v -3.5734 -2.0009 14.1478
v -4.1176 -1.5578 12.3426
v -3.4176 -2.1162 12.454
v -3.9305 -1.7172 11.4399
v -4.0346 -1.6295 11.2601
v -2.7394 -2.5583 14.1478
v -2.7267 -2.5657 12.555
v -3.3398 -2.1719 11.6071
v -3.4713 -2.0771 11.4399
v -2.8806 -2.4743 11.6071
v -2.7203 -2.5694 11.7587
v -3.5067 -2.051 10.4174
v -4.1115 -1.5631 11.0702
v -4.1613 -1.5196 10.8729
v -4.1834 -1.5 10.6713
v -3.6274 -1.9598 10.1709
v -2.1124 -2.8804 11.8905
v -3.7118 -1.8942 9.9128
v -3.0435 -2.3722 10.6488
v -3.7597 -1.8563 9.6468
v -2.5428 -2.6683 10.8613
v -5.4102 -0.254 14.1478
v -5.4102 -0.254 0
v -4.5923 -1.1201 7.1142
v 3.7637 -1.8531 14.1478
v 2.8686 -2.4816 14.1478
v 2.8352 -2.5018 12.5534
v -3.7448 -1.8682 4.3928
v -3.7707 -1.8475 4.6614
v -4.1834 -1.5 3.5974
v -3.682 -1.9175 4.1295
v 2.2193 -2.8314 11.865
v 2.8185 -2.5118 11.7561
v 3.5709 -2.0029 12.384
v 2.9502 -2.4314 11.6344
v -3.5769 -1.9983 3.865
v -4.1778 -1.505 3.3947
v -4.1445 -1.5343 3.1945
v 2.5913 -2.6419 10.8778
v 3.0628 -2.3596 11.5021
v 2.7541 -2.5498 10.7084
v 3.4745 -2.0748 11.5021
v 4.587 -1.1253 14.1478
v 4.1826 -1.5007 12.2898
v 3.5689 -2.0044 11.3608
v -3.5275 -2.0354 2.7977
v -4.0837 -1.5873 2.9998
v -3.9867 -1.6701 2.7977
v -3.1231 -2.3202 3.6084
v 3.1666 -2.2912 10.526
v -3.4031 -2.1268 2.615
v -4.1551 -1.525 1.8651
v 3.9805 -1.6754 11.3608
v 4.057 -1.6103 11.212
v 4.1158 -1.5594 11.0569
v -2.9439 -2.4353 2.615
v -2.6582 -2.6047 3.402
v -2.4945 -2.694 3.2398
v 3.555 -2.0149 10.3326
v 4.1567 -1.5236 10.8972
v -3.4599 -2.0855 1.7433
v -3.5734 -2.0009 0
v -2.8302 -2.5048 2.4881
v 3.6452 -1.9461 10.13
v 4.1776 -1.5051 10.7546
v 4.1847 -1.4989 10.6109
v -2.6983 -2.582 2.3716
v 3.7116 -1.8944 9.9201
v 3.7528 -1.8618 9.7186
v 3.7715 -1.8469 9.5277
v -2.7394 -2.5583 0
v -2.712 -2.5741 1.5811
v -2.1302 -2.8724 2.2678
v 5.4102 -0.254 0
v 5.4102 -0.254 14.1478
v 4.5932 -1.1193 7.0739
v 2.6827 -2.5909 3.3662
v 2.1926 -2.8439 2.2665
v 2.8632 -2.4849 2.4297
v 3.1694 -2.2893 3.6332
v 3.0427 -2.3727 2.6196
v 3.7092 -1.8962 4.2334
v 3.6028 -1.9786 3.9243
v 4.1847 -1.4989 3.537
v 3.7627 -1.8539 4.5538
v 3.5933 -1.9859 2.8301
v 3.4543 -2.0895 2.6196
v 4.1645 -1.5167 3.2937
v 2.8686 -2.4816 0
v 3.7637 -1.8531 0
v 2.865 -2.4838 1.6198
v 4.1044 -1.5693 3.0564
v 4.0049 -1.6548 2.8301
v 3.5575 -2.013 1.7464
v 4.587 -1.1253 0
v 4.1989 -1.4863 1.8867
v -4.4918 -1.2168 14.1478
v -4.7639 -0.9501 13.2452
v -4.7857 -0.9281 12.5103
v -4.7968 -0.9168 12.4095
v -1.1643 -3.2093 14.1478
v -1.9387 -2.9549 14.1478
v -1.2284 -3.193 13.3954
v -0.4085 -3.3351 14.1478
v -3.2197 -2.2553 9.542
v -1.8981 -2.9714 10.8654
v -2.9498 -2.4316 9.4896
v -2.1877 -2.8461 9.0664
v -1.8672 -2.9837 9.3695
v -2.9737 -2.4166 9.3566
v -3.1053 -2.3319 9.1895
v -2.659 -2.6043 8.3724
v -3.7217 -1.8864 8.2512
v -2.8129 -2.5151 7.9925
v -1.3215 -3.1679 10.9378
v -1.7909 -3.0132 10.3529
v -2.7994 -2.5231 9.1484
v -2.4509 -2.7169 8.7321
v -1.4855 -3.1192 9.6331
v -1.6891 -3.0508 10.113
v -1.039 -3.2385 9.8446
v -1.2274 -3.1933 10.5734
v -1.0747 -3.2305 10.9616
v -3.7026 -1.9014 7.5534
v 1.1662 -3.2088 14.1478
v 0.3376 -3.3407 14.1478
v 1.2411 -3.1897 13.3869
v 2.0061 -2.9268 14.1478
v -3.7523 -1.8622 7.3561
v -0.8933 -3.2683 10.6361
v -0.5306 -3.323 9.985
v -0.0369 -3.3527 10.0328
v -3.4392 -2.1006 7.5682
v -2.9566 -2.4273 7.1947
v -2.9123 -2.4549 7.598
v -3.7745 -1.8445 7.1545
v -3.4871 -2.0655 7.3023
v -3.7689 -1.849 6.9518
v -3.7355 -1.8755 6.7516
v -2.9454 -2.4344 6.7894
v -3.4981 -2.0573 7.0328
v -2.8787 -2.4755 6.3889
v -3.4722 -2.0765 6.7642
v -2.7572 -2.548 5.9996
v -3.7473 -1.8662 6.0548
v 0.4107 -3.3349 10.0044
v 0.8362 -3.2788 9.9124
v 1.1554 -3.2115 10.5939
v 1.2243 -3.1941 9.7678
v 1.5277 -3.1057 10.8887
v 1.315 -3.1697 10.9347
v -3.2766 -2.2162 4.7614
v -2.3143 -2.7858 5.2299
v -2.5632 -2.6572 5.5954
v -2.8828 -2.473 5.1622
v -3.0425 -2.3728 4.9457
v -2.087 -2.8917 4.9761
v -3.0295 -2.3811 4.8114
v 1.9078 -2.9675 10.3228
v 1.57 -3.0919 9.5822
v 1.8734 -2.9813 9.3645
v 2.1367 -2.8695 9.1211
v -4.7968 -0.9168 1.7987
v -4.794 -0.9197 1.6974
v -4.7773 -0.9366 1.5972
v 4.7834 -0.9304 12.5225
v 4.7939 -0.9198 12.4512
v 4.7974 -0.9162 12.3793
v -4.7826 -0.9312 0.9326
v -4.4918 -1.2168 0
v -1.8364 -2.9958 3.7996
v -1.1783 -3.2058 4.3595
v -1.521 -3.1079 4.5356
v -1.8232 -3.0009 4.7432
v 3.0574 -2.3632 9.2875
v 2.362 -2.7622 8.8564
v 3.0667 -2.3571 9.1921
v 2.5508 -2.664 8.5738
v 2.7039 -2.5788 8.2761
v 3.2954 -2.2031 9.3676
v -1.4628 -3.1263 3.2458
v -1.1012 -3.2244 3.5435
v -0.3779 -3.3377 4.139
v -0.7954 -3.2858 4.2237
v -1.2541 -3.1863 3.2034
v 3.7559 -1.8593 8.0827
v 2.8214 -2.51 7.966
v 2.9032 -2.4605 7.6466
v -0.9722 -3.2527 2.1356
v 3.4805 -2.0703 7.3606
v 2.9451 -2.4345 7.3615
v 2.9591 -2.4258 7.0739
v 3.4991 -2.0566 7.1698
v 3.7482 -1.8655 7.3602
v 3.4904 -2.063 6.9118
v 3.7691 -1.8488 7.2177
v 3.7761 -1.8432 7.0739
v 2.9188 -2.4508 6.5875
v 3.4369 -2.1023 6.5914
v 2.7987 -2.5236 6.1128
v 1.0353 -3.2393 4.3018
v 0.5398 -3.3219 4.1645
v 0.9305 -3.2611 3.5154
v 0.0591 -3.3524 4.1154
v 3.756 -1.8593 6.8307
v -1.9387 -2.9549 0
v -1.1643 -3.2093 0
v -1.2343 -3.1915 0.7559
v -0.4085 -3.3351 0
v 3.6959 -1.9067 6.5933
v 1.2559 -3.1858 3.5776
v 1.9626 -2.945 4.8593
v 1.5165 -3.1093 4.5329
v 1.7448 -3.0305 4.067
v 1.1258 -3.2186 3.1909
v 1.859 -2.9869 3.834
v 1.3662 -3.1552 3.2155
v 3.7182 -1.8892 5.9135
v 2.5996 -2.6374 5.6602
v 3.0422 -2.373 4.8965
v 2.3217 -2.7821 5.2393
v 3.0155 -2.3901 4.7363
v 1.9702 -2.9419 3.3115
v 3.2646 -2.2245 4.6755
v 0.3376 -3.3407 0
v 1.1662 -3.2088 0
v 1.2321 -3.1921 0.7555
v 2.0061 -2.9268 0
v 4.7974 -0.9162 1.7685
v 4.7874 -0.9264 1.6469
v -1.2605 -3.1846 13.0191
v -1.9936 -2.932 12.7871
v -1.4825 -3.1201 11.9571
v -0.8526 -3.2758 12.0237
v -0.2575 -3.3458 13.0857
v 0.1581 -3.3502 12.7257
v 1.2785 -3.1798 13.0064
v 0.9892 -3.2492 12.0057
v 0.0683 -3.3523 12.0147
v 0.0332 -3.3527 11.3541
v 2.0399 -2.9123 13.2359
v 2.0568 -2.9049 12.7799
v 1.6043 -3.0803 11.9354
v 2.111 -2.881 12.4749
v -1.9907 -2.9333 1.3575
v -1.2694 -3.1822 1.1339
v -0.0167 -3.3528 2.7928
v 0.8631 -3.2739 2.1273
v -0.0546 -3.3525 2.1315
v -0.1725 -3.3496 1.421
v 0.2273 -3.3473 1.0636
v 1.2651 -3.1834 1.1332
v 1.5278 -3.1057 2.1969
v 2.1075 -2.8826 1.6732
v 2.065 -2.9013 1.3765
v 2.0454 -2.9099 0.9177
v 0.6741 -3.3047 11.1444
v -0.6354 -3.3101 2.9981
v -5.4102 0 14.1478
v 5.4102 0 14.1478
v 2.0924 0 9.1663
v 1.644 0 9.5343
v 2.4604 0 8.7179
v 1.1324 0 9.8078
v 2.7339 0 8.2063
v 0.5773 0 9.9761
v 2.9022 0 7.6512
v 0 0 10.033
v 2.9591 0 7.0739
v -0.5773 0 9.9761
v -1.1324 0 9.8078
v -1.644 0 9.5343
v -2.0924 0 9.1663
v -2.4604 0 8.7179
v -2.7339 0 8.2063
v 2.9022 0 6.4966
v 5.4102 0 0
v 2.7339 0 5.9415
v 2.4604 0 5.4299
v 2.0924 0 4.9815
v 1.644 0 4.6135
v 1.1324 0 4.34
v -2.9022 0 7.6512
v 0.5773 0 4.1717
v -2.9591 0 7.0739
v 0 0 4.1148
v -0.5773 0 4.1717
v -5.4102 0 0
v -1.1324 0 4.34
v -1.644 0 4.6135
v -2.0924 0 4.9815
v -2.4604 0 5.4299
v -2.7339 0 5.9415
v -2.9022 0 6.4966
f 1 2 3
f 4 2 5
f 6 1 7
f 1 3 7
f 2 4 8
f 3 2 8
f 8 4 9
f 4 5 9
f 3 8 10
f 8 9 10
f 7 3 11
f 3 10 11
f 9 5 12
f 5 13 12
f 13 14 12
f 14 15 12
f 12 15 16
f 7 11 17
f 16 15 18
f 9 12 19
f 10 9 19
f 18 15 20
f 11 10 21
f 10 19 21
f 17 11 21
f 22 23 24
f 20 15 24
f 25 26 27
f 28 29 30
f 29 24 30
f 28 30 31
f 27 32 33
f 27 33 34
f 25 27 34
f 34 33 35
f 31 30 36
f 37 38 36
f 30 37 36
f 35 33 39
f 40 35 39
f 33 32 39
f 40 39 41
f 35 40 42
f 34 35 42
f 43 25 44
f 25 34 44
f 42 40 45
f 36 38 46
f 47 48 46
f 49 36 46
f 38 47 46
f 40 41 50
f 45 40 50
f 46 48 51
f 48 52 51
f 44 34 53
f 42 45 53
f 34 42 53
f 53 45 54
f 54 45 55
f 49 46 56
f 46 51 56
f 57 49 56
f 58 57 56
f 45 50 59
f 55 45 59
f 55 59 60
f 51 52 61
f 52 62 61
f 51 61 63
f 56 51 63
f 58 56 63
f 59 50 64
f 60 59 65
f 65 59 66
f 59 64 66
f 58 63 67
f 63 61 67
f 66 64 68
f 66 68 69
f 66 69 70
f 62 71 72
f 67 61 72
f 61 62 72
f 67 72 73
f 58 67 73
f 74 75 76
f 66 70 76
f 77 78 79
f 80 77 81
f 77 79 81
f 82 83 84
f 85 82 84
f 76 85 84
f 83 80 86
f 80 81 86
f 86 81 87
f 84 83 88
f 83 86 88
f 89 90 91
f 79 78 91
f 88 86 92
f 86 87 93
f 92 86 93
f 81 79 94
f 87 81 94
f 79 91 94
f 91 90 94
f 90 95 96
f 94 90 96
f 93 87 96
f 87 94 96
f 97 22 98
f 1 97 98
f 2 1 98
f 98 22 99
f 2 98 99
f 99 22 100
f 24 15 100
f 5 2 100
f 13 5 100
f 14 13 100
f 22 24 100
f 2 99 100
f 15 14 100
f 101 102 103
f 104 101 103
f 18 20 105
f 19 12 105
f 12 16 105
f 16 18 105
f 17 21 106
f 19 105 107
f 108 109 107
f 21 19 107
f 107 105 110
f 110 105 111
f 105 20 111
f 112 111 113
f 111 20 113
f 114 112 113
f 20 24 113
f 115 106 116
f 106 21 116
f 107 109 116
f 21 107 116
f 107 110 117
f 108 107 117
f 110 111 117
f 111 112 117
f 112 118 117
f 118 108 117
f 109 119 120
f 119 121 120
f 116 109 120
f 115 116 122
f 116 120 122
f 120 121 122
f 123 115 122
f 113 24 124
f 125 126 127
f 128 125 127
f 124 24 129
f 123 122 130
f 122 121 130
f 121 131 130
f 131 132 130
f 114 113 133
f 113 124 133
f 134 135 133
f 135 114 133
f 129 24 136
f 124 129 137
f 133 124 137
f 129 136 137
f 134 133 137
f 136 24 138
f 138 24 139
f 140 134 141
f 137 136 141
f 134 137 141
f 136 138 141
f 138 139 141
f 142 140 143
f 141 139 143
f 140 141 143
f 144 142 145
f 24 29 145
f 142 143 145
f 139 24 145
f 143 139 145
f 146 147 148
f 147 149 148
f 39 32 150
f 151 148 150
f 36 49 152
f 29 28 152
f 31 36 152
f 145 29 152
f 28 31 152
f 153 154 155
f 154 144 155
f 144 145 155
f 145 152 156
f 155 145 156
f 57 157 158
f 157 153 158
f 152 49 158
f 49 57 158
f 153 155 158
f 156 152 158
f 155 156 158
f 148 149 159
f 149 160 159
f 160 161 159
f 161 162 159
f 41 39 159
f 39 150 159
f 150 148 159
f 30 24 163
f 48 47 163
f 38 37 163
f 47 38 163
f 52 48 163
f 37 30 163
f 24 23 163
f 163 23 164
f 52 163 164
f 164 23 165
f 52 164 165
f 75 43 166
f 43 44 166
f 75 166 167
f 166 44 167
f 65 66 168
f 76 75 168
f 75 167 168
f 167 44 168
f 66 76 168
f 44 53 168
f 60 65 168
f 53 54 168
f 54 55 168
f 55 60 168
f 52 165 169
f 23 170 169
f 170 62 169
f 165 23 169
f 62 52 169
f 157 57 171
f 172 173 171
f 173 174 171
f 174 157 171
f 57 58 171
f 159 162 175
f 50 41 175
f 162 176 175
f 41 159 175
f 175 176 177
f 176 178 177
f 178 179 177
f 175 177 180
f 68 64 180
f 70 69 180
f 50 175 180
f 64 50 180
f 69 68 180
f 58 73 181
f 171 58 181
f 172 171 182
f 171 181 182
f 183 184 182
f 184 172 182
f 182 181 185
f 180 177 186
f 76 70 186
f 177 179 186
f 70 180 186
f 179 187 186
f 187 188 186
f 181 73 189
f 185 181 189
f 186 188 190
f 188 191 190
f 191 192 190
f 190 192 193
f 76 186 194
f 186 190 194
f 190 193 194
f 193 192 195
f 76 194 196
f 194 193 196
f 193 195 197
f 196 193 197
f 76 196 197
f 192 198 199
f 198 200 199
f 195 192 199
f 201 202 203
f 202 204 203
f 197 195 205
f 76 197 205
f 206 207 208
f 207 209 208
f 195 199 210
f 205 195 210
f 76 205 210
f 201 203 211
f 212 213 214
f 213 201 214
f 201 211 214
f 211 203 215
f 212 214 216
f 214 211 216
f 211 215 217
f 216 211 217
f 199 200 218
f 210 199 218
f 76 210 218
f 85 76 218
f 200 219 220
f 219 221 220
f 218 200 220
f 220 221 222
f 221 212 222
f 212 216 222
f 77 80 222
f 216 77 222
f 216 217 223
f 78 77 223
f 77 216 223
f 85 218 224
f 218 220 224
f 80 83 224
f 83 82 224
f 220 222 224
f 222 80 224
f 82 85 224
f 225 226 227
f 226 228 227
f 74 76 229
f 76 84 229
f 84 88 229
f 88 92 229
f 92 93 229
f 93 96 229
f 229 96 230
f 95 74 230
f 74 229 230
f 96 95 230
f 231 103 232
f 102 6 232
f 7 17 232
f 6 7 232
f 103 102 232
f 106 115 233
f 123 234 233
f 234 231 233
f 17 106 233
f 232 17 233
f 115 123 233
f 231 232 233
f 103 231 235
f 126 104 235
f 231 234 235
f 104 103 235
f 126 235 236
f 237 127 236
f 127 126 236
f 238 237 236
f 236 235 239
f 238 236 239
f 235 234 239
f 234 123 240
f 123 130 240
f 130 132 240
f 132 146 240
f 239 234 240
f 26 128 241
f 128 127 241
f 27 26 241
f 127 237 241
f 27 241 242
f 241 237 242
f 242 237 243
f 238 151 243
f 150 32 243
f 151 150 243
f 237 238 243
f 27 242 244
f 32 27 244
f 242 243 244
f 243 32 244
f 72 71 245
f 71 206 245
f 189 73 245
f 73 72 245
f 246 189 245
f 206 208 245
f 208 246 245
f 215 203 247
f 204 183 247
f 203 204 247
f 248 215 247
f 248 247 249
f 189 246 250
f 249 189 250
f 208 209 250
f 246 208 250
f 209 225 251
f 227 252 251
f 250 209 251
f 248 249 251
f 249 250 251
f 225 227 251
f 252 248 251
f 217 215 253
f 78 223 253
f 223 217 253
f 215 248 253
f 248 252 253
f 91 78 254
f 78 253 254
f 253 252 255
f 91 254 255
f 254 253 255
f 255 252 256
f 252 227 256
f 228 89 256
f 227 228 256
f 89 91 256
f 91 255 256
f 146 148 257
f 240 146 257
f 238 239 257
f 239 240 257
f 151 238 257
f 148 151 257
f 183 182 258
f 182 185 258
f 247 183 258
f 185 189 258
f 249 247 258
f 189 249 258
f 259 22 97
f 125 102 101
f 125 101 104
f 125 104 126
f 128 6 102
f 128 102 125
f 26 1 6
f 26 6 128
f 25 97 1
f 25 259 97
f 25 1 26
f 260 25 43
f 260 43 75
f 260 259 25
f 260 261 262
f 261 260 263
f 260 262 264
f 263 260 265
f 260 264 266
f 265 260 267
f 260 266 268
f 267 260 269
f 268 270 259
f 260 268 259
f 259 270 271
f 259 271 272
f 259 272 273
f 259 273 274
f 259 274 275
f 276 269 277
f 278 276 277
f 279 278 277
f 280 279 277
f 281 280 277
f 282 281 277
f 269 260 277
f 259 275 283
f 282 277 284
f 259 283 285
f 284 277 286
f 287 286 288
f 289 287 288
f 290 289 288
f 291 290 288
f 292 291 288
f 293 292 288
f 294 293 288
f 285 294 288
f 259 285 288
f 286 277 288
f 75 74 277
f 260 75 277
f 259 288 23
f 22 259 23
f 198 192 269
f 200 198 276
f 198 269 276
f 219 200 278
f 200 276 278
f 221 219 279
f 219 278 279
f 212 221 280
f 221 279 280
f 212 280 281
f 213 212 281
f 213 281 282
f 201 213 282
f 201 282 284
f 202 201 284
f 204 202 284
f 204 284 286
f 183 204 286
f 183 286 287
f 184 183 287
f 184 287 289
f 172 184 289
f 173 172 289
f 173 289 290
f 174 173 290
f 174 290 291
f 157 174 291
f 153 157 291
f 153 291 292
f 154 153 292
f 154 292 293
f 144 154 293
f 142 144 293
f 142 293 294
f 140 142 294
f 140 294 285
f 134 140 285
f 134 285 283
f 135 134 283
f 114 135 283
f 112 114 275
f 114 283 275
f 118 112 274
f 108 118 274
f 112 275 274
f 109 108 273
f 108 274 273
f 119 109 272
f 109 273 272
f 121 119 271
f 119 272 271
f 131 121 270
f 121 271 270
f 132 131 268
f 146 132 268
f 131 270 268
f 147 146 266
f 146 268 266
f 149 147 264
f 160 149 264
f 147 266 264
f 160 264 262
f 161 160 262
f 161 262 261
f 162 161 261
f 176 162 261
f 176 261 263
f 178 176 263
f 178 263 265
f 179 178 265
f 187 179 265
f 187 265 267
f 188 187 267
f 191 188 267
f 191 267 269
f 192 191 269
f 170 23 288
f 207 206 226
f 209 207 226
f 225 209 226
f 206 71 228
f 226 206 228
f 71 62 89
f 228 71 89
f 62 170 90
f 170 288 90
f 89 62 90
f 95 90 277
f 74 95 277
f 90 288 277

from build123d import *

# Parameters (mm, degrees)
BOSS_EXTRUDE1_DEPTH = 14.1478
SKETCH2_R           = 2.9591
CUT_EXTRUDE1_DEPTH  = 14.1478


with BuildPart() as part:
    # Sketch1 → Boss-Extrude1 (new body)
    with BuildSketch(Plane.XY):
        with BuildLine():
            Line((-5.4102, 0), (-5.4102, -0.254))
            add(Edge.make_bspline(
                [(-5.4102, -0.254), (6.345e-06, -6.451600503), (5.4102, -0.254)],
                knots=[0, 0, 0, 1, 1, 1], degree=2))
            Line((5.4102, -0.254), (5.4102, 0))
            Line((5.4102, 0), (-5.4102, 0))
        make_face()
    extrude(amount=BOSS_EXTRUDE1_DEPTH)

    # Sketch2 → Cut-Extrude1 (cut)
    with BuildSketch(Plane(origin=(0, 0, 0), x_dir=(1, 0, 0), z_dir=(0, 1, 0))):
        with Locations((0, -7.0739)):
            Circle(SKETCH2_R)
    extrude(amount=-CUT_EXTRUDE1_DEPTH, mode=Mode.SUBTRACT)


solid = part.part
